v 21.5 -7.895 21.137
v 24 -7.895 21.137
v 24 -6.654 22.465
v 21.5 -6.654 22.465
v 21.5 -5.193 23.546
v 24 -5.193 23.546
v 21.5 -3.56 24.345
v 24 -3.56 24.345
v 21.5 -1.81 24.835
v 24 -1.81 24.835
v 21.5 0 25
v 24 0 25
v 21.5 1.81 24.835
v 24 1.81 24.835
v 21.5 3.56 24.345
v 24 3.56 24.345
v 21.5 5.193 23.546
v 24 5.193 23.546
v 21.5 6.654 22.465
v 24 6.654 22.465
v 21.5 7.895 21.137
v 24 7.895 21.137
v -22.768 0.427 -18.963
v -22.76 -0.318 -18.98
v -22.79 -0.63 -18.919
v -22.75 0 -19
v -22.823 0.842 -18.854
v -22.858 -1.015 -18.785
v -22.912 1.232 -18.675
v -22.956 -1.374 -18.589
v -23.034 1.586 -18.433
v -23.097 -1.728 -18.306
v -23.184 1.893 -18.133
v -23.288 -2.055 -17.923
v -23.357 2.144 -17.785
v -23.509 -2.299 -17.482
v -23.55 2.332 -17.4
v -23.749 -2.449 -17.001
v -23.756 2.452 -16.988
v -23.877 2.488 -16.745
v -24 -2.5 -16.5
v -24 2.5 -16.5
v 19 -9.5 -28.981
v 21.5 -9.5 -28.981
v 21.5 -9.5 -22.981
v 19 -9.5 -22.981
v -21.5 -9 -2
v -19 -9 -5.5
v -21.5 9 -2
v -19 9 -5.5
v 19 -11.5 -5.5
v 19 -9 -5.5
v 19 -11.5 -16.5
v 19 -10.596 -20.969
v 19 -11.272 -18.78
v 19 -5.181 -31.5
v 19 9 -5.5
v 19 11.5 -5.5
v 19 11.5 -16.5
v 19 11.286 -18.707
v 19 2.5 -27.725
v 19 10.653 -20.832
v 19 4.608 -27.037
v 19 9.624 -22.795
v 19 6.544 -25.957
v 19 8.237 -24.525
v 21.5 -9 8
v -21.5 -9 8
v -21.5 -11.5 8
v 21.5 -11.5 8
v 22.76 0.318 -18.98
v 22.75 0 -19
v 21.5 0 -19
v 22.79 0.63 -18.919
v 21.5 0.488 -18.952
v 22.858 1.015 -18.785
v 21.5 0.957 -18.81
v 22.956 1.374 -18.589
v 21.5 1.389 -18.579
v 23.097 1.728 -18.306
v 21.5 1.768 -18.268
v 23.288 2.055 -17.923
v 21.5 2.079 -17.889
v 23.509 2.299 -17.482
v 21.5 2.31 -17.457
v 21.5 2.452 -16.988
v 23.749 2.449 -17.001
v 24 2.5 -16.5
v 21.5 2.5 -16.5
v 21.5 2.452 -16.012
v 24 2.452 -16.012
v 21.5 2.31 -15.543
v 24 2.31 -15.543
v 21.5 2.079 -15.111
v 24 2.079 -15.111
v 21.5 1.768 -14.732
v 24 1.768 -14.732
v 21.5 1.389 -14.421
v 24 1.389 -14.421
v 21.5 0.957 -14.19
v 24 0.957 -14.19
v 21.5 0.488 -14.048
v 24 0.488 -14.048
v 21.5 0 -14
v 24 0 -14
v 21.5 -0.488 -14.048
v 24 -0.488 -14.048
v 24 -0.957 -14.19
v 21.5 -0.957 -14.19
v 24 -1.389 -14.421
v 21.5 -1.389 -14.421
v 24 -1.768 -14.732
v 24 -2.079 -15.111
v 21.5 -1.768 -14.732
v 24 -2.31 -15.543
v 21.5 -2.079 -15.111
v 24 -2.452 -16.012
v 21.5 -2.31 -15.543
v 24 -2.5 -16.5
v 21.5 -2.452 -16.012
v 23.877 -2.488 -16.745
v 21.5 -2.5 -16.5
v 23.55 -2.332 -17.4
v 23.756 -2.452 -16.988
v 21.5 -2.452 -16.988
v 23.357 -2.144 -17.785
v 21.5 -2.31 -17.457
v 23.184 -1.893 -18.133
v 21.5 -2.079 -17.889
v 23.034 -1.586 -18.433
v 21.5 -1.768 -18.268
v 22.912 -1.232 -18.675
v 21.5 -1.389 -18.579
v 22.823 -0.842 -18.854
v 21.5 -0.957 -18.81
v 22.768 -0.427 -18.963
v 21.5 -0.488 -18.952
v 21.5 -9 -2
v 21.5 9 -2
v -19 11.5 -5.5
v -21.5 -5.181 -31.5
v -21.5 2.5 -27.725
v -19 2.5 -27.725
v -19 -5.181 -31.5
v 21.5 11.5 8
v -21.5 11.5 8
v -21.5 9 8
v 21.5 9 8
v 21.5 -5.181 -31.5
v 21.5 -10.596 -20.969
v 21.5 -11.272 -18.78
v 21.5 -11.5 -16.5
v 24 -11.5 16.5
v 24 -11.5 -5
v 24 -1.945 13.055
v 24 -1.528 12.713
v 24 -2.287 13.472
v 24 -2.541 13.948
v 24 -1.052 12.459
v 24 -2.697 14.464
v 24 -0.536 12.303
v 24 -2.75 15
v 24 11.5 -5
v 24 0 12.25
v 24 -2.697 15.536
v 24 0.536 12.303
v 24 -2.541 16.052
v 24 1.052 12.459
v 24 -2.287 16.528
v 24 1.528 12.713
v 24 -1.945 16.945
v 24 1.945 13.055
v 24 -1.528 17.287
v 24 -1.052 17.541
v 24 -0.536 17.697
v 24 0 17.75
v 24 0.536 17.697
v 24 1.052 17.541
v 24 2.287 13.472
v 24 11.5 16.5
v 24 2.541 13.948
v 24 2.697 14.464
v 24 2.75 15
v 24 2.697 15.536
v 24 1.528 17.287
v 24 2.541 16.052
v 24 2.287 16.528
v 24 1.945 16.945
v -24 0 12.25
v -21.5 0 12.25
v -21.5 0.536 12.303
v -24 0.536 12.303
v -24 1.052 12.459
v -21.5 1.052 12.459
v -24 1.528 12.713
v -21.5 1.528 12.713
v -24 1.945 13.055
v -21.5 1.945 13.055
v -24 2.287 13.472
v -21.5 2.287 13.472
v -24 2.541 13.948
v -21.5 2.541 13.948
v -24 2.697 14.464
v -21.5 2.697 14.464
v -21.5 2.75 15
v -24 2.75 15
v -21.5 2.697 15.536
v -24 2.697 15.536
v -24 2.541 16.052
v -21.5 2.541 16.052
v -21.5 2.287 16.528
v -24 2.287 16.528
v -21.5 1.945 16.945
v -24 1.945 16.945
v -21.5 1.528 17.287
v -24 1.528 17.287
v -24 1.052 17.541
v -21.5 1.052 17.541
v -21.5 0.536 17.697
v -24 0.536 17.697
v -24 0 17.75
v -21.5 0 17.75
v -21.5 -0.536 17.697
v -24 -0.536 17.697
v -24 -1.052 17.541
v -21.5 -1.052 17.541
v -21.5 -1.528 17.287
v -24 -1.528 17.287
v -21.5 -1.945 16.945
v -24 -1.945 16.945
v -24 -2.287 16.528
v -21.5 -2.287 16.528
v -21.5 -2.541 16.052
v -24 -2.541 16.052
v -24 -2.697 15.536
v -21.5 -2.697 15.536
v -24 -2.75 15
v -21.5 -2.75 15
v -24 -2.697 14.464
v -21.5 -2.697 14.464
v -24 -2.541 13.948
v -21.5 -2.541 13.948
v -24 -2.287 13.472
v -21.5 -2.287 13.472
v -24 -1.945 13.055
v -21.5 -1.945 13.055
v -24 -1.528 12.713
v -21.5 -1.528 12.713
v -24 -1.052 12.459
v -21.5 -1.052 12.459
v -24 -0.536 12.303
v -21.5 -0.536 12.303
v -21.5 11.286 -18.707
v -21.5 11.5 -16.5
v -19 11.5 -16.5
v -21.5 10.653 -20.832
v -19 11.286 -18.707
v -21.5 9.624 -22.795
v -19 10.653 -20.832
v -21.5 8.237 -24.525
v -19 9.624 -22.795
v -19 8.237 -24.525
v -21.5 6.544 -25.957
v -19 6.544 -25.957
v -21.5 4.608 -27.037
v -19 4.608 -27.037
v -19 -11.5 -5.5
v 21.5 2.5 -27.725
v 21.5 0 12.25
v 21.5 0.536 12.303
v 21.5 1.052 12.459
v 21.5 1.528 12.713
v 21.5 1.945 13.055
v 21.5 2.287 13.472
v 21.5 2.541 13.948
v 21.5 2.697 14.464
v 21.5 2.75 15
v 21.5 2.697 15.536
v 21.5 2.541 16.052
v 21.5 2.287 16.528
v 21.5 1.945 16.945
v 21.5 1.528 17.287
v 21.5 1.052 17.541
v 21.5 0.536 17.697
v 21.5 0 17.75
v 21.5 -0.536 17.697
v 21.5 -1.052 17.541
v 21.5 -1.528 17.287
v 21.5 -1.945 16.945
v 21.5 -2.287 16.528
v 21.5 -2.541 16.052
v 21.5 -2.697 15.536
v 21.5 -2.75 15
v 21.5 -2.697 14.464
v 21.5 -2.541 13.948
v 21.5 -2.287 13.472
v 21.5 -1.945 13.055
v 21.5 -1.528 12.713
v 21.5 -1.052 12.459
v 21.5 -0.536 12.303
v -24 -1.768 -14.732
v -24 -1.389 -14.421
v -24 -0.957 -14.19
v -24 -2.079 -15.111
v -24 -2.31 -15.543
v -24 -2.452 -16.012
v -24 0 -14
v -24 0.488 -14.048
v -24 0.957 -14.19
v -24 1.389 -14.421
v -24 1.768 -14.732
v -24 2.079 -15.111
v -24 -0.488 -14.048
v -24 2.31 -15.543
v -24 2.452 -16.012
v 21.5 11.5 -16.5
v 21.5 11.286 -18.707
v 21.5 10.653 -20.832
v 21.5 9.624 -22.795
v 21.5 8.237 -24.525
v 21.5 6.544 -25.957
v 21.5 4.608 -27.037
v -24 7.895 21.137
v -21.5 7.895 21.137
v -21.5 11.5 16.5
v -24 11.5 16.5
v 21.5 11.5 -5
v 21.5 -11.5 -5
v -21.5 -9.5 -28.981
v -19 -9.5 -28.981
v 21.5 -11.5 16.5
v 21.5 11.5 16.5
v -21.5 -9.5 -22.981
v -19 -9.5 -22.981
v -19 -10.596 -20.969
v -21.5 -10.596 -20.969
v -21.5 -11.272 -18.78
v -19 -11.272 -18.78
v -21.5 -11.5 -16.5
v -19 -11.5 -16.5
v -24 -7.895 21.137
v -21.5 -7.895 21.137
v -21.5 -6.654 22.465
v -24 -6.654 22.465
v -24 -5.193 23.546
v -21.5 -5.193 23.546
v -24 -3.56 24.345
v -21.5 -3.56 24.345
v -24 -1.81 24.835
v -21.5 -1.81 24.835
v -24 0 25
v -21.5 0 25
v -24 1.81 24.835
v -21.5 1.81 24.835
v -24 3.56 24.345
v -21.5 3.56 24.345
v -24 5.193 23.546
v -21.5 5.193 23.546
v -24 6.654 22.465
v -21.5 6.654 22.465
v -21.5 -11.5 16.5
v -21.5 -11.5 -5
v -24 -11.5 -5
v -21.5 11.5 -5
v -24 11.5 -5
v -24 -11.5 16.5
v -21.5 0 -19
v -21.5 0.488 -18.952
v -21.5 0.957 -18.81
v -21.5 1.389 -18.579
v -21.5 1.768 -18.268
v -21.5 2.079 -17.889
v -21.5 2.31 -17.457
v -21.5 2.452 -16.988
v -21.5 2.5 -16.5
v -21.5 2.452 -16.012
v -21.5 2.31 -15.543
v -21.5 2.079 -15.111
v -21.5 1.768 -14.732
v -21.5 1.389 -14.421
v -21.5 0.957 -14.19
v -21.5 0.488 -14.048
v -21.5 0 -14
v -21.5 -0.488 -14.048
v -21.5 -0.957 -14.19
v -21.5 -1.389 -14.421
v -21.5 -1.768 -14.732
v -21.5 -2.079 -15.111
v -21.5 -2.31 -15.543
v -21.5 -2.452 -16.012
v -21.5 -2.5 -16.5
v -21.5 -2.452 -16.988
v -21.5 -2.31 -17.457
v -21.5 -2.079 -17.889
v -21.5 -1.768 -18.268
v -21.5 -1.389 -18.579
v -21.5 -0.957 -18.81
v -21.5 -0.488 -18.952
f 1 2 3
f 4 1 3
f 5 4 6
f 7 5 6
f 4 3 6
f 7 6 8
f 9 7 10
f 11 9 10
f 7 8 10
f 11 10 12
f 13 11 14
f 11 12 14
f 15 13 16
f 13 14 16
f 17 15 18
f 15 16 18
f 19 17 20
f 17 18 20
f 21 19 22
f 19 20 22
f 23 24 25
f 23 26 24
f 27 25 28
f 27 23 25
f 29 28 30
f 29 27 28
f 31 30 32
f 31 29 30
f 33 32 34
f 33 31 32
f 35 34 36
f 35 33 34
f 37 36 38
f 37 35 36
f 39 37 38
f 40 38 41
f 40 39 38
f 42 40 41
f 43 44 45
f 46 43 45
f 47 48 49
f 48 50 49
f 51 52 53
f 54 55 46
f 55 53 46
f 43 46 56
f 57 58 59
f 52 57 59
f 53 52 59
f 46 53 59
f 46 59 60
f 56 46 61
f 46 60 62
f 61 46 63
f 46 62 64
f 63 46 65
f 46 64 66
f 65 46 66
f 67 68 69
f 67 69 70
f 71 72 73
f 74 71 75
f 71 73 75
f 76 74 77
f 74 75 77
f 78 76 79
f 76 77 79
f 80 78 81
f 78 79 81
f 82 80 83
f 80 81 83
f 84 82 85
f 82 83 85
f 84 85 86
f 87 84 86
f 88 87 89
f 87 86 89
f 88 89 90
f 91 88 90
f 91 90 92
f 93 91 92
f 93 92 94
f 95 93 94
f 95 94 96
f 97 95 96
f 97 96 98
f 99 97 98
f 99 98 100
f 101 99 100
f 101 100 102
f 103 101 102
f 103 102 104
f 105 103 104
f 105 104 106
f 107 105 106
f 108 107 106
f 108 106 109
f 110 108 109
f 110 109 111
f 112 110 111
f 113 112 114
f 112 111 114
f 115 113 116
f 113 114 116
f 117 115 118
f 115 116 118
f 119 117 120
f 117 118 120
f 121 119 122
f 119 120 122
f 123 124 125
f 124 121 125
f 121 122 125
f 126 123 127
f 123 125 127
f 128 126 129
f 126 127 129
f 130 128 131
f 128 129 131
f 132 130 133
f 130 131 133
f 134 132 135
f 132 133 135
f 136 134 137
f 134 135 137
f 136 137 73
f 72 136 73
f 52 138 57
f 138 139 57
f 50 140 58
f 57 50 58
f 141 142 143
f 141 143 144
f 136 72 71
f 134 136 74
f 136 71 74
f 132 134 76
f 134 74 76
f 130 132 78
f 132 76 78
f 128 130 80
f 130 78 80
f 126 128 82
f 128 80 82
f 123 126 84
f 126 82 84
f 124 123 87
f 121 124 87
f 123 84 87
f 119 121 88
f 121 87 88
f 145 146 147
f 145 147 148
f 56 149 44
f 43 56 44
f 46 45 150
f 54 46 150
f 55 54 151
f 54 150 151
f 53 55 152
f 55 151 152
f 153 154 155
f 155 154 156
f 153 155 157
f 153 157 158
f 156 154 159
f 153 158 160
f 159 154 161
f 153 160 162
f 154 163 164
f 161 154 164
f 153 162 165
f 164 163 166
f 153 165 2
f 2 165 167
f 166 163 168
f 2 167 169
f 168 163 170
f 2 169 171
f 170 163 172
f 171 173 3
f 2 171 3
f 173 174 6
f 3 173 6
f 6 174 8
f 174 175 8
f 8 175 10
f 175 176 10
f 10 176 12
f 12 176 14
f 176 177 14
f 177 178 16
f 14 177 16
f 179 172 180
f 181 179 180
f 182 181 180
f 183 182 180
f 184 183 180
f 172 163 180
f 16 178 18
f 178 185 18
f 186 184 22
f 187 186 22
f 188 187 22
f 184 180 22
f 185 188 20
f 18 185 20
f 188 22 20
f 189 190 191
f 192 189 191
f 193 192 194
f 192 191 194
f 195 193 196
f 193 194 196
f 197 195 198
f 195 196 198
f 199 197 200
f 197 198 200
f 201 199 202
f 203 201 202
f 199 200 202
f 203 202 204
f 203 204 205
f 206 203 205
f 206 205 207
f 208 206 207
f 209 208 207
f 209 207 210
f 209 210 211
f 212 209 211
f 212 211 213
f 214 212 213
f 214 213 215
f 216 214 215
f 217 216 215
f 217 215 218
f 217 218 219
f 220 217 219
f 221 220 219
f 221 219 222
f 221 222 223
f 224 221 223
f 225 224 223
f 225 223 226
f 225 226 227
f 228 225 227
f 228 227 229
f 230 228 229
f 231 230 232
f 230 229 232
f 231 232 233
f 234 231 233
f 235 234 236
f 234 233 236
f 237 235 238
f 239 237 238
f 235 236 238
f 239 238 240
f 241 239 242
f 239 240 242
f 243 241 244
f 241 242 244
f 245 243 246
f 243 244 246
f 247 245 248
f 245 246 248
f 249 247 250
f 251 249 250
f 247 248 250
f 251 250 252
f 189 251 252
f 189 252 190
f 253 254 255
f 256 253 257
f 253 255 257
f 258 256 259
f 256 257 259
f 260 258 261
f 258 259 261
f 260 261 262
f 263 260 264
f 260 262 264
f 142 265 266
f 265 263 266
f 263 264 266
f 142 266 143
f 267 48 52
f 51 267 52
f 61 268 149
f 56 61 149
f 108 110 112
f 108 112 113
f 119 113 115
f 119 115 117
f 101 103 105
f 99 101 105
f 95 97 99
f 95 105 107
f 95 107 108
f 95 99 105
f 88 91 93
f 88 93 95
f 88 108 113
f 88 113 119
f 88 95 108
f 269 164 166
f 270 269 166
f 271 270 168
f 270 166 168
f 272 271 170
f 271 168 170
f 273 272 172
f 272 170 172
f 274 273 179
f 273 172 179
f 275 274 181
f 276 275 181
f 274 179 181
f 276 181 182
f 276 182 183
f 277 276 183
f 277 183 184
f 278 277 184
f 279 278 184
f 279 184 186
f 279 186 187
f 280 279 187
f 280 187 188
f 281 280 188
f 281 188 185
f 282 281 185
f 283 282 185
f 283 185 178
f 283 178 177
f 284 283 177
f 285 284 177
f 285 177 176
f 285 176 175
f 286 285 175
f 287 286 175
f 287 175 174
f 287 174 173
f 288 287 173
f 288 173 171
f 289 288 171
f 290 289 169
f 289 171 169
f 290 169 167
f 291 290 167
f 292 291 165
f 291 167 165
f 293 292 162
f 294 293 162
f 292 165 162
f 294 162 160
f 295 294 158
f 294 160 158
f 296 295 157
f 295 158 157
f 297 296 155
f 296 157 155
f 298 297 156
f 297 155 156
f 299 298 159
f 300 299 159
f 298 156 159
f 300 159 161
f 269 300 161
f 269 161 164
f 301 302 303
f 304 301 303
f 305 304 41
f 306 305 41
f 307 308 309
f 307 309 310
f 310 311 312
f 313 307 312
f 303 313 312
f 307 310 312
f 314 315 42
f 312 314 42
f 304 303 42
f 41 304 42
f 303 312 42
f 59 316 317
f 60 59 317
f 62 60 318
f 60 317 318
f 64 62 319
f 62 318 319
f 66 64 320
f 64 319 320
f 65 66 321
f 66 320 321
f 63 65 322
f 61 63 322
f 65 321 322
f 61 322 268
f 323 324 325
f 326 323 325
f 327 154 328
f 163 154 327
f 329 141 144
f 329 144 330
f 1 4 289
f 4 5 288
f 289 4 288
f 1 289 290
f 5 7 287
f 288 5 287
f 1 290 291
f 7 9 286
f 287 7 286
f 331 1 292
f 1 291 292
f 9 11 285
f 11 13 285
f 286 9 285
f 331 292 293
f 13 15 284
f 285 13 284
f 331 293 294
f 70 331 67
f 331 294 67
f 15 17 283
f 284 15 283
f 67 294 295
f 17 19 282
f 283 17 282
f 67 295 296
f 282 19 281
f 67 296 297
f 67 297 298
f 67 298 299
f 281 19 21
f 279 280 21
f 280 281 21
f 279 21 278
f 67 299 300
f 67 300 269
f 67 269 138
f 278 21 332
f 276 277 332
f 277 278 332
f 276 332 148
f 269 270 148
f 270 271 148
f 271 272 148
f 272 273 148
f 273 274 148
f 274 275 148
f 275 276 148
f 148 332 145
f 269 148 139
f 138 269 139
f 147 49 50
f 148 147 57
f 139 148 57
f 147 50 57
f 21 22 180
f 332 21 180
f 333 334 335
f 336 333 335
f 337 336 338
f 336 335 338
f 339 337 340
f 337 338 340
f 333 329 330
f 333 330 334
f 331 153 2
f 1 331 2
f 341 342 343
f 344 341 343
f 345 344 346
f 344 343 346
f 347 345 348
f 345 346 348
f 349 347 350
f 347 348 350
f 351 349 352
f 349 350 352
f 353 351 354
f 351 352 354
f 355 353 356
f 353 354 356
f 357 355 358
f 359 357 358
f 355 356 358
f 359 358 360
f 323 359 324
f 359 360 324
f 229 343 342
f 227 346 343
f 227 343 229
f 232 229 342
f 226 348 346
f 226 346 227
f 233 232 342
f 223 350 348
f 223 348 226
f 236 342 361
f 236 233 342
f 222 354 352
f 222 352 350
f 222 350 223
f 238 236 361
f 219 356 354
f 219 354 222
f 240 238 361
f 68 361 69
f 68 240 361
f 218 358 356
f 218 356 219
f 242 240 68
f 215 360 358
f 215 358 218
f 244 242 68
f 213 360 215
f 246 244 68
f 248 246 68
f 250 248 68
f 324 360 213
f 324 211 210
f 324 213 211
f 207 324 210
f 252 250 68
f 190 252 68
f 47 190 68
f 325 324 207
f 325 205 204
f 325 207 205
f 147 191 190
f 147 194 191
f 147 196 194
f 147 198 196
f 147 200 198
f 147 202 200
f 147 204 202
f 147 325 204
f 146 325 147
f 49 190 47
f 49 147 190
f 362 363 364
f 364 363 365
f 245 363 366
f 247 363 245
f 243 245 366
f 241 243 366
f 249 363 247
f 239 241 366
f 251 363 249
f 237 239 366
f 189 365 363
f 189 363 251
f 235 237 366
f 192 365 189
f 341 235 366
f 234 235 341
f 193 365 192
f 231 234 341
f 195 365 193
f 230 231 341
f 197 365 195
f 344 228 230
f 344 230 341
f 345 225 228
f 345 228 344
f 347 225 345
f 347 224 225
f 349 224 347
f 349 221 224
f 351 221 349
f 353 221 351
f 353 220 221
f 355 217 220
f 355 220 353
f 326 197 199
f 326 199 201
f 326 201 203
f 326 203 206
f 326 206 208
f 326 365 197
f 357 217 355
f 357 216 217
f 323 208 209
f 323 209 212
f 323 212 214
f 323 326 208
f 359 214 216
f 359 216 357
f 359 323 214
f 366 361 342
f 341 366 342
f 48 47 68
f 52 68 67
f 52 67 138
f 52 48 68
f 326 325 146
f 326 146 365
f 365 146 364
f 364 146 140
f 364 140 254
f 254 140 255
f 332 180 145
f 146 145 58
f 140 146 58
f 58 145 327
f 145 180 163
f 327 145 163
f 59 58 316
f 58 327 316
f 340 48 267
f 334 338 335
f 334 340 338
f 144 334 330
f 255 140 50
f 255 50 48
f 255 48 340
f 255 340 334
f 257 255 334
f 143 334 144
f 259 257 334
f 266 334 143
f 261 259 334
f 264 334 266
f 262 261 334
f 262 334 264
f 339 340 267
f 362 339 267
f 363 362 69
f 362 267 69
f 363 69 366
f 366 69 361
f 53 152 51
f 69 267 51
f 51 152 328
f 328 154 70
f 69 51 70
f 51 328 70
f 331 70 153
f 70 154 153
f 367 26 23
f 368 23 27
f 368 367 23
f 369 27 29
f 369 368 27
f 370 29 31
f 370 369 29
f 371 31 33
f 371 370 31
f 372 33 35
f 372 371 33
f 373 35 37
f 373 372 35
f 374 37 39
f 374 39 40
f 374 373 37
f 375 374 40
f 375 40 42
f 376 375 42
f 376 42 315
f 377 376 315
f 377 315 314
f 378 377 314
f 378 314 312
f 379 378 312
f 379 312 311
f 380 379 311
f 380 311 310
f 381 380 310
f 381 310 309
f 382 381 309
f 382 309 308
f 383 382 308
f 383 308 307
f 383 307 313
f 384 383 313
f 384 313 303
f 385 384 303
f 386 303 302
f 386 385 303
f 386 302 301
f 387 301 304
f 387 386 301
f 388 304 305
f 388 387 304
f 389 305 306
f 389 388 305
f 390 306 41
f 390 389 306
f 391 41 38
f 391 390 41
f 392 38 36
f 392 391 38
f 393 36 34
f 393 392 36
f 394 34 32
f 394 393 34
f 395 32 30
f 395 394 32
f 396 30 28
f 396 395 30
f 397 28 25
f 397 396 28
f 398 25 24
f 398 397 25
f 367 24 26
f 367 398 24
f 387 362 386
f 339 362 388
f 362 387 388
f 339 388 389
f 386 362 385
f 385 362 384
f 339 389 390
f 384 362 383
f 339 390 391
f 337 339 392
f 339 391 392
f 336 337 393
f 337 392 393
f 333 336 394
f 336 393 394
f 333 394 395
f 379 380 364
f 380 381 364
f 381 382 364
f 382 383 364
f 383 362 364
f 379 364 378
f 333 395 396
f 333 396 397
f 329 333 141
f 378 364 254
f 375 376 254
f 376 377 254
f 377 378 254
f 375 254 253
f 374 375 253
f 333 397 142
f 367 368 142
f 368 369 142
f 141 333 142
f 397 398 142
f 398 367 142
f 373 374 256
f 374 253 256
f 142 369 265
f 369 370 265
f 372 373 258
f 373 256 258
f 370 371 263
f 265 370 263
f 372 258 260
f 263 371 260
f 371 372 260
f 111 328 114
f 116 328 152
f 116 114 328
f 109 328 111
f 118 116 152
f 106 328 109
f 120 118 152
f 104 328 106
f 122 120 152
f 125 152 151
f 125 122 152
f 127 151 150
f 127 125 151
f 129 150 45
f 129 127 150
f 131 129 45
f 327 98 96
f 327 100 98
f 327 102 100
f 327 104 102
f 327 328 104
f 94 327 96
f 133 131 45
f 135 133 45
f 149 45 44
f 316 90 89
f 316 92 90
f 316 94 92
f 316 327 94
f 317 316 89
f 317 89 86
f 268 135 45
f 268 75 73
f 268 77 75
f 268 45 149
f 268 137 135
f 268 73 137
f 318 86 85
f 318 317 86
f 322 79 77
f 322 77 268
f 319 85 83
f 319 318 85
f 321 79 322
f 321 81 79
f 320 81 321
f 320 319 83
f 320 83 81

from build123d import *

# Parameters (mm, degrees)
BOSS_EXTRUDE1_DEPTH = 24
SKETCH2_W           = 23
SKETCH2_H           = 23
CUT_EXTRUDE1_DEPTH  = 2.5
SKETCH4_W           = 43
SKETCH4_H           = 17
CUT_EXTRUDE2_DEPTH  = 44.462627624
SKETCH5_W           = 38
SKETCH5_H           = 22.5
CUT_EXTRUDE3_DEPTH  = 44.462627624
CUT_EXTRUDE4_DEPTH  = 9
SKETCH7_R           = 2.75
CUT_EXTRUDE5_DEPTH  = 57.747246629
SKETCH8_R           = 2.5
BOSS_EXTRUDE2_DEPTH = 2.5
CUT_EXTRUDE6_DEPTH  = 44.462627624
BOSS_EXTRUDE4_DEPTH = 2.5


with BuildPart() as part:
    # Sketch1 → Boss-Extrude1 (new, symmetric)
    with BuildSketch(Plane(origin=(0, 0, 0), x_dir=(0, 0, -1), z_dir=(1, 0, 0))):
        with BuildLine():
            Line((16.5, -11.5), (-16.5, -11.5))
            Line((-16.5, -11.5), (-21.137338715, -7.895129733))
            ThreePointArc((-21.137338715, -7.895129733), (-25, 0), (-21.137338715, 7.895129733))
            Line((-21.137338715, 7.895129733), (-16.5, 11.5))
            Line((-16.5, 11.5), (16.5, 11.5))
            ThreePointArc((16.5, 11.5), (28, 0), (16.5, -11.5))
        make_face()
    extrude(amount=BOSS_EXTRUDE1_DEPTH, both=True)

    # Sketch2 → Cut-Extrude1 (cut)
    with BuildSketch(Plane(origin=(24, 0, 0), x_dir=(0, 0, -1), z_dir=(1, 0, 0))):
        with Locations((16.5, 0)):
            Rectangle(SKETCH2_W, SKETCH2_H)
    cut_extrude1 = extrude(amount=-CUT_EXTRUDE1_DEPTH, mode=Mode.SUBTRACT)

    # Mirror1: Cut-Extrude1 across plane
    add(cut_extrude1.mirror(Plane(origin=(0, 0, 0), x_dir=(0, 0, 1), z_dir=(1, 0, 0))), mode=Mode.SUBTRACT)

    # Sketch4 → Cut-Extrude2 (cut, through all)
    with BuildSketch(Plane(origin=(0, 11.5, 0), x_dir=(1, 0, 0), z_dir=(0, 1, 0))):
        with Locations((0, -16.5)):
            Rectangle(SKETCH4_W, SKETCH4_H)
    extrude(amount=-CUT_EXTRUDE2_DEPTH, mode=Mode.SUBTRACT)

    # Sketch5 → Cut-Extrude3 (cut, through all)
    with BuildSketch(Plane(origin=(0, 11.5, 0), x_dir=(1, 0, 0), z_dir=(0, 1, 0))):
        with Locations((0, 16.75)):
            Rectangle(SKETCH5_W, SKETCH5_H)
    extrude(amount=-CUT_EXTRUDE3_DEPTH, mode=Mode.SUBTRACT)

    # Sketch6 → Cut-Extrude4 (cut, symmetric)
    with BuildSketch(Plane(origin=(0, 0, 0), x_dir=(1, 0, 0), z_dir=(0, 1, 0))):
        Polygon((-19, 5.5), (-21.5, 2), (-21.5, -8), (21.5, -8), (21.5, 2), (19, 5.5), align=None)
    extrude(amount=CUT_EXTRUDE4_DEPTH, both=True, mode=Mode.SUBTRACT)

    # Sketch7 → Cut-Extrude5 (cut, through all)
    with BuildSketch(Plane(origin=(24, 0, 0), x_dir=(0, 0, -1), z_dir=(1, 0, 0))):
        with Locations((-15, 0)):
            Circle(SKETCH7_R)
    extrude(amount=-CUT_EXTRUDE5_DEPTH, mode=Mode.SUBTRACT)

    # Sketch8 → Boss-Extrude2 (add, through all)
    with BuildSketch(Plane(origin=(21.5, 0, 0), x_dir=(0, 0, -1), z_dir=(1, 0, 0))):
        with Locations((16.5, 0)):
            Circle(SKETCH8_R)
    boss_extrude2 = extrude(amount=BOSS_EXTRUDE2_DEPTH)

    # Sketch9 → Cut-Extrude6 (cut, through all)
    with BuildSketch(Plane(origin=(0, 11.5, 0), x_dir=(1, 0, 0), z_dir=(0, 1, 0))):
        Polygon((22.75, 19), (24, 16.5), (24, 19), align=None)
    cut_extrude6 = extrude(amount=-CUT_EXTRUDE6_DEPTH, mode=Mode.SUBTRACT)

    # Sketch10 → Boss-Extrude4 (add)
    with BuildSketch(Plane(origin=(21.5, 0, 0), x_dir=(0, 0, -1), z_dir=(1, 0, 0))):
        with BuildLine():
            Line((27.72497216, 2.5), (31.5, -5.181049598))
            Line((31.5, -5.181049598), (28.980740698, -9.5))
            Line((28.980740698, -9.5), (22.980740698, -9.5))
            ThreePointArc((22.980740698, -9.5), (27.194534443, -4.228112231), (27.72497216, 2.5))
        make_face()
    boss_extrude4 = extrude(amount=-BOSS_EXTRUDE4_DEPTH)

    # Mirror2: Boss-Extrude2, Cut-Extrude6, Boss-Extrude4 across plane
    add(boss_extrude2.mirror(Plane(origin=(0, 0, 0), x_dir=(0, 0, 1), z_dir=(1, 0, 0))))
    add(cut_extrude6.mirror(Plane(origin=(0, 0, 0), x_dir=(0, 0, 1), z_dir=(1, 0, 0))), mode=Mode.SUBTRACT)
    add(boss_extrude4.mirror(Plane(origin=(0, 0, 0), x_dir=(0, 0, 1), z_dir=(1, 0, 0))))


solid = part.part
